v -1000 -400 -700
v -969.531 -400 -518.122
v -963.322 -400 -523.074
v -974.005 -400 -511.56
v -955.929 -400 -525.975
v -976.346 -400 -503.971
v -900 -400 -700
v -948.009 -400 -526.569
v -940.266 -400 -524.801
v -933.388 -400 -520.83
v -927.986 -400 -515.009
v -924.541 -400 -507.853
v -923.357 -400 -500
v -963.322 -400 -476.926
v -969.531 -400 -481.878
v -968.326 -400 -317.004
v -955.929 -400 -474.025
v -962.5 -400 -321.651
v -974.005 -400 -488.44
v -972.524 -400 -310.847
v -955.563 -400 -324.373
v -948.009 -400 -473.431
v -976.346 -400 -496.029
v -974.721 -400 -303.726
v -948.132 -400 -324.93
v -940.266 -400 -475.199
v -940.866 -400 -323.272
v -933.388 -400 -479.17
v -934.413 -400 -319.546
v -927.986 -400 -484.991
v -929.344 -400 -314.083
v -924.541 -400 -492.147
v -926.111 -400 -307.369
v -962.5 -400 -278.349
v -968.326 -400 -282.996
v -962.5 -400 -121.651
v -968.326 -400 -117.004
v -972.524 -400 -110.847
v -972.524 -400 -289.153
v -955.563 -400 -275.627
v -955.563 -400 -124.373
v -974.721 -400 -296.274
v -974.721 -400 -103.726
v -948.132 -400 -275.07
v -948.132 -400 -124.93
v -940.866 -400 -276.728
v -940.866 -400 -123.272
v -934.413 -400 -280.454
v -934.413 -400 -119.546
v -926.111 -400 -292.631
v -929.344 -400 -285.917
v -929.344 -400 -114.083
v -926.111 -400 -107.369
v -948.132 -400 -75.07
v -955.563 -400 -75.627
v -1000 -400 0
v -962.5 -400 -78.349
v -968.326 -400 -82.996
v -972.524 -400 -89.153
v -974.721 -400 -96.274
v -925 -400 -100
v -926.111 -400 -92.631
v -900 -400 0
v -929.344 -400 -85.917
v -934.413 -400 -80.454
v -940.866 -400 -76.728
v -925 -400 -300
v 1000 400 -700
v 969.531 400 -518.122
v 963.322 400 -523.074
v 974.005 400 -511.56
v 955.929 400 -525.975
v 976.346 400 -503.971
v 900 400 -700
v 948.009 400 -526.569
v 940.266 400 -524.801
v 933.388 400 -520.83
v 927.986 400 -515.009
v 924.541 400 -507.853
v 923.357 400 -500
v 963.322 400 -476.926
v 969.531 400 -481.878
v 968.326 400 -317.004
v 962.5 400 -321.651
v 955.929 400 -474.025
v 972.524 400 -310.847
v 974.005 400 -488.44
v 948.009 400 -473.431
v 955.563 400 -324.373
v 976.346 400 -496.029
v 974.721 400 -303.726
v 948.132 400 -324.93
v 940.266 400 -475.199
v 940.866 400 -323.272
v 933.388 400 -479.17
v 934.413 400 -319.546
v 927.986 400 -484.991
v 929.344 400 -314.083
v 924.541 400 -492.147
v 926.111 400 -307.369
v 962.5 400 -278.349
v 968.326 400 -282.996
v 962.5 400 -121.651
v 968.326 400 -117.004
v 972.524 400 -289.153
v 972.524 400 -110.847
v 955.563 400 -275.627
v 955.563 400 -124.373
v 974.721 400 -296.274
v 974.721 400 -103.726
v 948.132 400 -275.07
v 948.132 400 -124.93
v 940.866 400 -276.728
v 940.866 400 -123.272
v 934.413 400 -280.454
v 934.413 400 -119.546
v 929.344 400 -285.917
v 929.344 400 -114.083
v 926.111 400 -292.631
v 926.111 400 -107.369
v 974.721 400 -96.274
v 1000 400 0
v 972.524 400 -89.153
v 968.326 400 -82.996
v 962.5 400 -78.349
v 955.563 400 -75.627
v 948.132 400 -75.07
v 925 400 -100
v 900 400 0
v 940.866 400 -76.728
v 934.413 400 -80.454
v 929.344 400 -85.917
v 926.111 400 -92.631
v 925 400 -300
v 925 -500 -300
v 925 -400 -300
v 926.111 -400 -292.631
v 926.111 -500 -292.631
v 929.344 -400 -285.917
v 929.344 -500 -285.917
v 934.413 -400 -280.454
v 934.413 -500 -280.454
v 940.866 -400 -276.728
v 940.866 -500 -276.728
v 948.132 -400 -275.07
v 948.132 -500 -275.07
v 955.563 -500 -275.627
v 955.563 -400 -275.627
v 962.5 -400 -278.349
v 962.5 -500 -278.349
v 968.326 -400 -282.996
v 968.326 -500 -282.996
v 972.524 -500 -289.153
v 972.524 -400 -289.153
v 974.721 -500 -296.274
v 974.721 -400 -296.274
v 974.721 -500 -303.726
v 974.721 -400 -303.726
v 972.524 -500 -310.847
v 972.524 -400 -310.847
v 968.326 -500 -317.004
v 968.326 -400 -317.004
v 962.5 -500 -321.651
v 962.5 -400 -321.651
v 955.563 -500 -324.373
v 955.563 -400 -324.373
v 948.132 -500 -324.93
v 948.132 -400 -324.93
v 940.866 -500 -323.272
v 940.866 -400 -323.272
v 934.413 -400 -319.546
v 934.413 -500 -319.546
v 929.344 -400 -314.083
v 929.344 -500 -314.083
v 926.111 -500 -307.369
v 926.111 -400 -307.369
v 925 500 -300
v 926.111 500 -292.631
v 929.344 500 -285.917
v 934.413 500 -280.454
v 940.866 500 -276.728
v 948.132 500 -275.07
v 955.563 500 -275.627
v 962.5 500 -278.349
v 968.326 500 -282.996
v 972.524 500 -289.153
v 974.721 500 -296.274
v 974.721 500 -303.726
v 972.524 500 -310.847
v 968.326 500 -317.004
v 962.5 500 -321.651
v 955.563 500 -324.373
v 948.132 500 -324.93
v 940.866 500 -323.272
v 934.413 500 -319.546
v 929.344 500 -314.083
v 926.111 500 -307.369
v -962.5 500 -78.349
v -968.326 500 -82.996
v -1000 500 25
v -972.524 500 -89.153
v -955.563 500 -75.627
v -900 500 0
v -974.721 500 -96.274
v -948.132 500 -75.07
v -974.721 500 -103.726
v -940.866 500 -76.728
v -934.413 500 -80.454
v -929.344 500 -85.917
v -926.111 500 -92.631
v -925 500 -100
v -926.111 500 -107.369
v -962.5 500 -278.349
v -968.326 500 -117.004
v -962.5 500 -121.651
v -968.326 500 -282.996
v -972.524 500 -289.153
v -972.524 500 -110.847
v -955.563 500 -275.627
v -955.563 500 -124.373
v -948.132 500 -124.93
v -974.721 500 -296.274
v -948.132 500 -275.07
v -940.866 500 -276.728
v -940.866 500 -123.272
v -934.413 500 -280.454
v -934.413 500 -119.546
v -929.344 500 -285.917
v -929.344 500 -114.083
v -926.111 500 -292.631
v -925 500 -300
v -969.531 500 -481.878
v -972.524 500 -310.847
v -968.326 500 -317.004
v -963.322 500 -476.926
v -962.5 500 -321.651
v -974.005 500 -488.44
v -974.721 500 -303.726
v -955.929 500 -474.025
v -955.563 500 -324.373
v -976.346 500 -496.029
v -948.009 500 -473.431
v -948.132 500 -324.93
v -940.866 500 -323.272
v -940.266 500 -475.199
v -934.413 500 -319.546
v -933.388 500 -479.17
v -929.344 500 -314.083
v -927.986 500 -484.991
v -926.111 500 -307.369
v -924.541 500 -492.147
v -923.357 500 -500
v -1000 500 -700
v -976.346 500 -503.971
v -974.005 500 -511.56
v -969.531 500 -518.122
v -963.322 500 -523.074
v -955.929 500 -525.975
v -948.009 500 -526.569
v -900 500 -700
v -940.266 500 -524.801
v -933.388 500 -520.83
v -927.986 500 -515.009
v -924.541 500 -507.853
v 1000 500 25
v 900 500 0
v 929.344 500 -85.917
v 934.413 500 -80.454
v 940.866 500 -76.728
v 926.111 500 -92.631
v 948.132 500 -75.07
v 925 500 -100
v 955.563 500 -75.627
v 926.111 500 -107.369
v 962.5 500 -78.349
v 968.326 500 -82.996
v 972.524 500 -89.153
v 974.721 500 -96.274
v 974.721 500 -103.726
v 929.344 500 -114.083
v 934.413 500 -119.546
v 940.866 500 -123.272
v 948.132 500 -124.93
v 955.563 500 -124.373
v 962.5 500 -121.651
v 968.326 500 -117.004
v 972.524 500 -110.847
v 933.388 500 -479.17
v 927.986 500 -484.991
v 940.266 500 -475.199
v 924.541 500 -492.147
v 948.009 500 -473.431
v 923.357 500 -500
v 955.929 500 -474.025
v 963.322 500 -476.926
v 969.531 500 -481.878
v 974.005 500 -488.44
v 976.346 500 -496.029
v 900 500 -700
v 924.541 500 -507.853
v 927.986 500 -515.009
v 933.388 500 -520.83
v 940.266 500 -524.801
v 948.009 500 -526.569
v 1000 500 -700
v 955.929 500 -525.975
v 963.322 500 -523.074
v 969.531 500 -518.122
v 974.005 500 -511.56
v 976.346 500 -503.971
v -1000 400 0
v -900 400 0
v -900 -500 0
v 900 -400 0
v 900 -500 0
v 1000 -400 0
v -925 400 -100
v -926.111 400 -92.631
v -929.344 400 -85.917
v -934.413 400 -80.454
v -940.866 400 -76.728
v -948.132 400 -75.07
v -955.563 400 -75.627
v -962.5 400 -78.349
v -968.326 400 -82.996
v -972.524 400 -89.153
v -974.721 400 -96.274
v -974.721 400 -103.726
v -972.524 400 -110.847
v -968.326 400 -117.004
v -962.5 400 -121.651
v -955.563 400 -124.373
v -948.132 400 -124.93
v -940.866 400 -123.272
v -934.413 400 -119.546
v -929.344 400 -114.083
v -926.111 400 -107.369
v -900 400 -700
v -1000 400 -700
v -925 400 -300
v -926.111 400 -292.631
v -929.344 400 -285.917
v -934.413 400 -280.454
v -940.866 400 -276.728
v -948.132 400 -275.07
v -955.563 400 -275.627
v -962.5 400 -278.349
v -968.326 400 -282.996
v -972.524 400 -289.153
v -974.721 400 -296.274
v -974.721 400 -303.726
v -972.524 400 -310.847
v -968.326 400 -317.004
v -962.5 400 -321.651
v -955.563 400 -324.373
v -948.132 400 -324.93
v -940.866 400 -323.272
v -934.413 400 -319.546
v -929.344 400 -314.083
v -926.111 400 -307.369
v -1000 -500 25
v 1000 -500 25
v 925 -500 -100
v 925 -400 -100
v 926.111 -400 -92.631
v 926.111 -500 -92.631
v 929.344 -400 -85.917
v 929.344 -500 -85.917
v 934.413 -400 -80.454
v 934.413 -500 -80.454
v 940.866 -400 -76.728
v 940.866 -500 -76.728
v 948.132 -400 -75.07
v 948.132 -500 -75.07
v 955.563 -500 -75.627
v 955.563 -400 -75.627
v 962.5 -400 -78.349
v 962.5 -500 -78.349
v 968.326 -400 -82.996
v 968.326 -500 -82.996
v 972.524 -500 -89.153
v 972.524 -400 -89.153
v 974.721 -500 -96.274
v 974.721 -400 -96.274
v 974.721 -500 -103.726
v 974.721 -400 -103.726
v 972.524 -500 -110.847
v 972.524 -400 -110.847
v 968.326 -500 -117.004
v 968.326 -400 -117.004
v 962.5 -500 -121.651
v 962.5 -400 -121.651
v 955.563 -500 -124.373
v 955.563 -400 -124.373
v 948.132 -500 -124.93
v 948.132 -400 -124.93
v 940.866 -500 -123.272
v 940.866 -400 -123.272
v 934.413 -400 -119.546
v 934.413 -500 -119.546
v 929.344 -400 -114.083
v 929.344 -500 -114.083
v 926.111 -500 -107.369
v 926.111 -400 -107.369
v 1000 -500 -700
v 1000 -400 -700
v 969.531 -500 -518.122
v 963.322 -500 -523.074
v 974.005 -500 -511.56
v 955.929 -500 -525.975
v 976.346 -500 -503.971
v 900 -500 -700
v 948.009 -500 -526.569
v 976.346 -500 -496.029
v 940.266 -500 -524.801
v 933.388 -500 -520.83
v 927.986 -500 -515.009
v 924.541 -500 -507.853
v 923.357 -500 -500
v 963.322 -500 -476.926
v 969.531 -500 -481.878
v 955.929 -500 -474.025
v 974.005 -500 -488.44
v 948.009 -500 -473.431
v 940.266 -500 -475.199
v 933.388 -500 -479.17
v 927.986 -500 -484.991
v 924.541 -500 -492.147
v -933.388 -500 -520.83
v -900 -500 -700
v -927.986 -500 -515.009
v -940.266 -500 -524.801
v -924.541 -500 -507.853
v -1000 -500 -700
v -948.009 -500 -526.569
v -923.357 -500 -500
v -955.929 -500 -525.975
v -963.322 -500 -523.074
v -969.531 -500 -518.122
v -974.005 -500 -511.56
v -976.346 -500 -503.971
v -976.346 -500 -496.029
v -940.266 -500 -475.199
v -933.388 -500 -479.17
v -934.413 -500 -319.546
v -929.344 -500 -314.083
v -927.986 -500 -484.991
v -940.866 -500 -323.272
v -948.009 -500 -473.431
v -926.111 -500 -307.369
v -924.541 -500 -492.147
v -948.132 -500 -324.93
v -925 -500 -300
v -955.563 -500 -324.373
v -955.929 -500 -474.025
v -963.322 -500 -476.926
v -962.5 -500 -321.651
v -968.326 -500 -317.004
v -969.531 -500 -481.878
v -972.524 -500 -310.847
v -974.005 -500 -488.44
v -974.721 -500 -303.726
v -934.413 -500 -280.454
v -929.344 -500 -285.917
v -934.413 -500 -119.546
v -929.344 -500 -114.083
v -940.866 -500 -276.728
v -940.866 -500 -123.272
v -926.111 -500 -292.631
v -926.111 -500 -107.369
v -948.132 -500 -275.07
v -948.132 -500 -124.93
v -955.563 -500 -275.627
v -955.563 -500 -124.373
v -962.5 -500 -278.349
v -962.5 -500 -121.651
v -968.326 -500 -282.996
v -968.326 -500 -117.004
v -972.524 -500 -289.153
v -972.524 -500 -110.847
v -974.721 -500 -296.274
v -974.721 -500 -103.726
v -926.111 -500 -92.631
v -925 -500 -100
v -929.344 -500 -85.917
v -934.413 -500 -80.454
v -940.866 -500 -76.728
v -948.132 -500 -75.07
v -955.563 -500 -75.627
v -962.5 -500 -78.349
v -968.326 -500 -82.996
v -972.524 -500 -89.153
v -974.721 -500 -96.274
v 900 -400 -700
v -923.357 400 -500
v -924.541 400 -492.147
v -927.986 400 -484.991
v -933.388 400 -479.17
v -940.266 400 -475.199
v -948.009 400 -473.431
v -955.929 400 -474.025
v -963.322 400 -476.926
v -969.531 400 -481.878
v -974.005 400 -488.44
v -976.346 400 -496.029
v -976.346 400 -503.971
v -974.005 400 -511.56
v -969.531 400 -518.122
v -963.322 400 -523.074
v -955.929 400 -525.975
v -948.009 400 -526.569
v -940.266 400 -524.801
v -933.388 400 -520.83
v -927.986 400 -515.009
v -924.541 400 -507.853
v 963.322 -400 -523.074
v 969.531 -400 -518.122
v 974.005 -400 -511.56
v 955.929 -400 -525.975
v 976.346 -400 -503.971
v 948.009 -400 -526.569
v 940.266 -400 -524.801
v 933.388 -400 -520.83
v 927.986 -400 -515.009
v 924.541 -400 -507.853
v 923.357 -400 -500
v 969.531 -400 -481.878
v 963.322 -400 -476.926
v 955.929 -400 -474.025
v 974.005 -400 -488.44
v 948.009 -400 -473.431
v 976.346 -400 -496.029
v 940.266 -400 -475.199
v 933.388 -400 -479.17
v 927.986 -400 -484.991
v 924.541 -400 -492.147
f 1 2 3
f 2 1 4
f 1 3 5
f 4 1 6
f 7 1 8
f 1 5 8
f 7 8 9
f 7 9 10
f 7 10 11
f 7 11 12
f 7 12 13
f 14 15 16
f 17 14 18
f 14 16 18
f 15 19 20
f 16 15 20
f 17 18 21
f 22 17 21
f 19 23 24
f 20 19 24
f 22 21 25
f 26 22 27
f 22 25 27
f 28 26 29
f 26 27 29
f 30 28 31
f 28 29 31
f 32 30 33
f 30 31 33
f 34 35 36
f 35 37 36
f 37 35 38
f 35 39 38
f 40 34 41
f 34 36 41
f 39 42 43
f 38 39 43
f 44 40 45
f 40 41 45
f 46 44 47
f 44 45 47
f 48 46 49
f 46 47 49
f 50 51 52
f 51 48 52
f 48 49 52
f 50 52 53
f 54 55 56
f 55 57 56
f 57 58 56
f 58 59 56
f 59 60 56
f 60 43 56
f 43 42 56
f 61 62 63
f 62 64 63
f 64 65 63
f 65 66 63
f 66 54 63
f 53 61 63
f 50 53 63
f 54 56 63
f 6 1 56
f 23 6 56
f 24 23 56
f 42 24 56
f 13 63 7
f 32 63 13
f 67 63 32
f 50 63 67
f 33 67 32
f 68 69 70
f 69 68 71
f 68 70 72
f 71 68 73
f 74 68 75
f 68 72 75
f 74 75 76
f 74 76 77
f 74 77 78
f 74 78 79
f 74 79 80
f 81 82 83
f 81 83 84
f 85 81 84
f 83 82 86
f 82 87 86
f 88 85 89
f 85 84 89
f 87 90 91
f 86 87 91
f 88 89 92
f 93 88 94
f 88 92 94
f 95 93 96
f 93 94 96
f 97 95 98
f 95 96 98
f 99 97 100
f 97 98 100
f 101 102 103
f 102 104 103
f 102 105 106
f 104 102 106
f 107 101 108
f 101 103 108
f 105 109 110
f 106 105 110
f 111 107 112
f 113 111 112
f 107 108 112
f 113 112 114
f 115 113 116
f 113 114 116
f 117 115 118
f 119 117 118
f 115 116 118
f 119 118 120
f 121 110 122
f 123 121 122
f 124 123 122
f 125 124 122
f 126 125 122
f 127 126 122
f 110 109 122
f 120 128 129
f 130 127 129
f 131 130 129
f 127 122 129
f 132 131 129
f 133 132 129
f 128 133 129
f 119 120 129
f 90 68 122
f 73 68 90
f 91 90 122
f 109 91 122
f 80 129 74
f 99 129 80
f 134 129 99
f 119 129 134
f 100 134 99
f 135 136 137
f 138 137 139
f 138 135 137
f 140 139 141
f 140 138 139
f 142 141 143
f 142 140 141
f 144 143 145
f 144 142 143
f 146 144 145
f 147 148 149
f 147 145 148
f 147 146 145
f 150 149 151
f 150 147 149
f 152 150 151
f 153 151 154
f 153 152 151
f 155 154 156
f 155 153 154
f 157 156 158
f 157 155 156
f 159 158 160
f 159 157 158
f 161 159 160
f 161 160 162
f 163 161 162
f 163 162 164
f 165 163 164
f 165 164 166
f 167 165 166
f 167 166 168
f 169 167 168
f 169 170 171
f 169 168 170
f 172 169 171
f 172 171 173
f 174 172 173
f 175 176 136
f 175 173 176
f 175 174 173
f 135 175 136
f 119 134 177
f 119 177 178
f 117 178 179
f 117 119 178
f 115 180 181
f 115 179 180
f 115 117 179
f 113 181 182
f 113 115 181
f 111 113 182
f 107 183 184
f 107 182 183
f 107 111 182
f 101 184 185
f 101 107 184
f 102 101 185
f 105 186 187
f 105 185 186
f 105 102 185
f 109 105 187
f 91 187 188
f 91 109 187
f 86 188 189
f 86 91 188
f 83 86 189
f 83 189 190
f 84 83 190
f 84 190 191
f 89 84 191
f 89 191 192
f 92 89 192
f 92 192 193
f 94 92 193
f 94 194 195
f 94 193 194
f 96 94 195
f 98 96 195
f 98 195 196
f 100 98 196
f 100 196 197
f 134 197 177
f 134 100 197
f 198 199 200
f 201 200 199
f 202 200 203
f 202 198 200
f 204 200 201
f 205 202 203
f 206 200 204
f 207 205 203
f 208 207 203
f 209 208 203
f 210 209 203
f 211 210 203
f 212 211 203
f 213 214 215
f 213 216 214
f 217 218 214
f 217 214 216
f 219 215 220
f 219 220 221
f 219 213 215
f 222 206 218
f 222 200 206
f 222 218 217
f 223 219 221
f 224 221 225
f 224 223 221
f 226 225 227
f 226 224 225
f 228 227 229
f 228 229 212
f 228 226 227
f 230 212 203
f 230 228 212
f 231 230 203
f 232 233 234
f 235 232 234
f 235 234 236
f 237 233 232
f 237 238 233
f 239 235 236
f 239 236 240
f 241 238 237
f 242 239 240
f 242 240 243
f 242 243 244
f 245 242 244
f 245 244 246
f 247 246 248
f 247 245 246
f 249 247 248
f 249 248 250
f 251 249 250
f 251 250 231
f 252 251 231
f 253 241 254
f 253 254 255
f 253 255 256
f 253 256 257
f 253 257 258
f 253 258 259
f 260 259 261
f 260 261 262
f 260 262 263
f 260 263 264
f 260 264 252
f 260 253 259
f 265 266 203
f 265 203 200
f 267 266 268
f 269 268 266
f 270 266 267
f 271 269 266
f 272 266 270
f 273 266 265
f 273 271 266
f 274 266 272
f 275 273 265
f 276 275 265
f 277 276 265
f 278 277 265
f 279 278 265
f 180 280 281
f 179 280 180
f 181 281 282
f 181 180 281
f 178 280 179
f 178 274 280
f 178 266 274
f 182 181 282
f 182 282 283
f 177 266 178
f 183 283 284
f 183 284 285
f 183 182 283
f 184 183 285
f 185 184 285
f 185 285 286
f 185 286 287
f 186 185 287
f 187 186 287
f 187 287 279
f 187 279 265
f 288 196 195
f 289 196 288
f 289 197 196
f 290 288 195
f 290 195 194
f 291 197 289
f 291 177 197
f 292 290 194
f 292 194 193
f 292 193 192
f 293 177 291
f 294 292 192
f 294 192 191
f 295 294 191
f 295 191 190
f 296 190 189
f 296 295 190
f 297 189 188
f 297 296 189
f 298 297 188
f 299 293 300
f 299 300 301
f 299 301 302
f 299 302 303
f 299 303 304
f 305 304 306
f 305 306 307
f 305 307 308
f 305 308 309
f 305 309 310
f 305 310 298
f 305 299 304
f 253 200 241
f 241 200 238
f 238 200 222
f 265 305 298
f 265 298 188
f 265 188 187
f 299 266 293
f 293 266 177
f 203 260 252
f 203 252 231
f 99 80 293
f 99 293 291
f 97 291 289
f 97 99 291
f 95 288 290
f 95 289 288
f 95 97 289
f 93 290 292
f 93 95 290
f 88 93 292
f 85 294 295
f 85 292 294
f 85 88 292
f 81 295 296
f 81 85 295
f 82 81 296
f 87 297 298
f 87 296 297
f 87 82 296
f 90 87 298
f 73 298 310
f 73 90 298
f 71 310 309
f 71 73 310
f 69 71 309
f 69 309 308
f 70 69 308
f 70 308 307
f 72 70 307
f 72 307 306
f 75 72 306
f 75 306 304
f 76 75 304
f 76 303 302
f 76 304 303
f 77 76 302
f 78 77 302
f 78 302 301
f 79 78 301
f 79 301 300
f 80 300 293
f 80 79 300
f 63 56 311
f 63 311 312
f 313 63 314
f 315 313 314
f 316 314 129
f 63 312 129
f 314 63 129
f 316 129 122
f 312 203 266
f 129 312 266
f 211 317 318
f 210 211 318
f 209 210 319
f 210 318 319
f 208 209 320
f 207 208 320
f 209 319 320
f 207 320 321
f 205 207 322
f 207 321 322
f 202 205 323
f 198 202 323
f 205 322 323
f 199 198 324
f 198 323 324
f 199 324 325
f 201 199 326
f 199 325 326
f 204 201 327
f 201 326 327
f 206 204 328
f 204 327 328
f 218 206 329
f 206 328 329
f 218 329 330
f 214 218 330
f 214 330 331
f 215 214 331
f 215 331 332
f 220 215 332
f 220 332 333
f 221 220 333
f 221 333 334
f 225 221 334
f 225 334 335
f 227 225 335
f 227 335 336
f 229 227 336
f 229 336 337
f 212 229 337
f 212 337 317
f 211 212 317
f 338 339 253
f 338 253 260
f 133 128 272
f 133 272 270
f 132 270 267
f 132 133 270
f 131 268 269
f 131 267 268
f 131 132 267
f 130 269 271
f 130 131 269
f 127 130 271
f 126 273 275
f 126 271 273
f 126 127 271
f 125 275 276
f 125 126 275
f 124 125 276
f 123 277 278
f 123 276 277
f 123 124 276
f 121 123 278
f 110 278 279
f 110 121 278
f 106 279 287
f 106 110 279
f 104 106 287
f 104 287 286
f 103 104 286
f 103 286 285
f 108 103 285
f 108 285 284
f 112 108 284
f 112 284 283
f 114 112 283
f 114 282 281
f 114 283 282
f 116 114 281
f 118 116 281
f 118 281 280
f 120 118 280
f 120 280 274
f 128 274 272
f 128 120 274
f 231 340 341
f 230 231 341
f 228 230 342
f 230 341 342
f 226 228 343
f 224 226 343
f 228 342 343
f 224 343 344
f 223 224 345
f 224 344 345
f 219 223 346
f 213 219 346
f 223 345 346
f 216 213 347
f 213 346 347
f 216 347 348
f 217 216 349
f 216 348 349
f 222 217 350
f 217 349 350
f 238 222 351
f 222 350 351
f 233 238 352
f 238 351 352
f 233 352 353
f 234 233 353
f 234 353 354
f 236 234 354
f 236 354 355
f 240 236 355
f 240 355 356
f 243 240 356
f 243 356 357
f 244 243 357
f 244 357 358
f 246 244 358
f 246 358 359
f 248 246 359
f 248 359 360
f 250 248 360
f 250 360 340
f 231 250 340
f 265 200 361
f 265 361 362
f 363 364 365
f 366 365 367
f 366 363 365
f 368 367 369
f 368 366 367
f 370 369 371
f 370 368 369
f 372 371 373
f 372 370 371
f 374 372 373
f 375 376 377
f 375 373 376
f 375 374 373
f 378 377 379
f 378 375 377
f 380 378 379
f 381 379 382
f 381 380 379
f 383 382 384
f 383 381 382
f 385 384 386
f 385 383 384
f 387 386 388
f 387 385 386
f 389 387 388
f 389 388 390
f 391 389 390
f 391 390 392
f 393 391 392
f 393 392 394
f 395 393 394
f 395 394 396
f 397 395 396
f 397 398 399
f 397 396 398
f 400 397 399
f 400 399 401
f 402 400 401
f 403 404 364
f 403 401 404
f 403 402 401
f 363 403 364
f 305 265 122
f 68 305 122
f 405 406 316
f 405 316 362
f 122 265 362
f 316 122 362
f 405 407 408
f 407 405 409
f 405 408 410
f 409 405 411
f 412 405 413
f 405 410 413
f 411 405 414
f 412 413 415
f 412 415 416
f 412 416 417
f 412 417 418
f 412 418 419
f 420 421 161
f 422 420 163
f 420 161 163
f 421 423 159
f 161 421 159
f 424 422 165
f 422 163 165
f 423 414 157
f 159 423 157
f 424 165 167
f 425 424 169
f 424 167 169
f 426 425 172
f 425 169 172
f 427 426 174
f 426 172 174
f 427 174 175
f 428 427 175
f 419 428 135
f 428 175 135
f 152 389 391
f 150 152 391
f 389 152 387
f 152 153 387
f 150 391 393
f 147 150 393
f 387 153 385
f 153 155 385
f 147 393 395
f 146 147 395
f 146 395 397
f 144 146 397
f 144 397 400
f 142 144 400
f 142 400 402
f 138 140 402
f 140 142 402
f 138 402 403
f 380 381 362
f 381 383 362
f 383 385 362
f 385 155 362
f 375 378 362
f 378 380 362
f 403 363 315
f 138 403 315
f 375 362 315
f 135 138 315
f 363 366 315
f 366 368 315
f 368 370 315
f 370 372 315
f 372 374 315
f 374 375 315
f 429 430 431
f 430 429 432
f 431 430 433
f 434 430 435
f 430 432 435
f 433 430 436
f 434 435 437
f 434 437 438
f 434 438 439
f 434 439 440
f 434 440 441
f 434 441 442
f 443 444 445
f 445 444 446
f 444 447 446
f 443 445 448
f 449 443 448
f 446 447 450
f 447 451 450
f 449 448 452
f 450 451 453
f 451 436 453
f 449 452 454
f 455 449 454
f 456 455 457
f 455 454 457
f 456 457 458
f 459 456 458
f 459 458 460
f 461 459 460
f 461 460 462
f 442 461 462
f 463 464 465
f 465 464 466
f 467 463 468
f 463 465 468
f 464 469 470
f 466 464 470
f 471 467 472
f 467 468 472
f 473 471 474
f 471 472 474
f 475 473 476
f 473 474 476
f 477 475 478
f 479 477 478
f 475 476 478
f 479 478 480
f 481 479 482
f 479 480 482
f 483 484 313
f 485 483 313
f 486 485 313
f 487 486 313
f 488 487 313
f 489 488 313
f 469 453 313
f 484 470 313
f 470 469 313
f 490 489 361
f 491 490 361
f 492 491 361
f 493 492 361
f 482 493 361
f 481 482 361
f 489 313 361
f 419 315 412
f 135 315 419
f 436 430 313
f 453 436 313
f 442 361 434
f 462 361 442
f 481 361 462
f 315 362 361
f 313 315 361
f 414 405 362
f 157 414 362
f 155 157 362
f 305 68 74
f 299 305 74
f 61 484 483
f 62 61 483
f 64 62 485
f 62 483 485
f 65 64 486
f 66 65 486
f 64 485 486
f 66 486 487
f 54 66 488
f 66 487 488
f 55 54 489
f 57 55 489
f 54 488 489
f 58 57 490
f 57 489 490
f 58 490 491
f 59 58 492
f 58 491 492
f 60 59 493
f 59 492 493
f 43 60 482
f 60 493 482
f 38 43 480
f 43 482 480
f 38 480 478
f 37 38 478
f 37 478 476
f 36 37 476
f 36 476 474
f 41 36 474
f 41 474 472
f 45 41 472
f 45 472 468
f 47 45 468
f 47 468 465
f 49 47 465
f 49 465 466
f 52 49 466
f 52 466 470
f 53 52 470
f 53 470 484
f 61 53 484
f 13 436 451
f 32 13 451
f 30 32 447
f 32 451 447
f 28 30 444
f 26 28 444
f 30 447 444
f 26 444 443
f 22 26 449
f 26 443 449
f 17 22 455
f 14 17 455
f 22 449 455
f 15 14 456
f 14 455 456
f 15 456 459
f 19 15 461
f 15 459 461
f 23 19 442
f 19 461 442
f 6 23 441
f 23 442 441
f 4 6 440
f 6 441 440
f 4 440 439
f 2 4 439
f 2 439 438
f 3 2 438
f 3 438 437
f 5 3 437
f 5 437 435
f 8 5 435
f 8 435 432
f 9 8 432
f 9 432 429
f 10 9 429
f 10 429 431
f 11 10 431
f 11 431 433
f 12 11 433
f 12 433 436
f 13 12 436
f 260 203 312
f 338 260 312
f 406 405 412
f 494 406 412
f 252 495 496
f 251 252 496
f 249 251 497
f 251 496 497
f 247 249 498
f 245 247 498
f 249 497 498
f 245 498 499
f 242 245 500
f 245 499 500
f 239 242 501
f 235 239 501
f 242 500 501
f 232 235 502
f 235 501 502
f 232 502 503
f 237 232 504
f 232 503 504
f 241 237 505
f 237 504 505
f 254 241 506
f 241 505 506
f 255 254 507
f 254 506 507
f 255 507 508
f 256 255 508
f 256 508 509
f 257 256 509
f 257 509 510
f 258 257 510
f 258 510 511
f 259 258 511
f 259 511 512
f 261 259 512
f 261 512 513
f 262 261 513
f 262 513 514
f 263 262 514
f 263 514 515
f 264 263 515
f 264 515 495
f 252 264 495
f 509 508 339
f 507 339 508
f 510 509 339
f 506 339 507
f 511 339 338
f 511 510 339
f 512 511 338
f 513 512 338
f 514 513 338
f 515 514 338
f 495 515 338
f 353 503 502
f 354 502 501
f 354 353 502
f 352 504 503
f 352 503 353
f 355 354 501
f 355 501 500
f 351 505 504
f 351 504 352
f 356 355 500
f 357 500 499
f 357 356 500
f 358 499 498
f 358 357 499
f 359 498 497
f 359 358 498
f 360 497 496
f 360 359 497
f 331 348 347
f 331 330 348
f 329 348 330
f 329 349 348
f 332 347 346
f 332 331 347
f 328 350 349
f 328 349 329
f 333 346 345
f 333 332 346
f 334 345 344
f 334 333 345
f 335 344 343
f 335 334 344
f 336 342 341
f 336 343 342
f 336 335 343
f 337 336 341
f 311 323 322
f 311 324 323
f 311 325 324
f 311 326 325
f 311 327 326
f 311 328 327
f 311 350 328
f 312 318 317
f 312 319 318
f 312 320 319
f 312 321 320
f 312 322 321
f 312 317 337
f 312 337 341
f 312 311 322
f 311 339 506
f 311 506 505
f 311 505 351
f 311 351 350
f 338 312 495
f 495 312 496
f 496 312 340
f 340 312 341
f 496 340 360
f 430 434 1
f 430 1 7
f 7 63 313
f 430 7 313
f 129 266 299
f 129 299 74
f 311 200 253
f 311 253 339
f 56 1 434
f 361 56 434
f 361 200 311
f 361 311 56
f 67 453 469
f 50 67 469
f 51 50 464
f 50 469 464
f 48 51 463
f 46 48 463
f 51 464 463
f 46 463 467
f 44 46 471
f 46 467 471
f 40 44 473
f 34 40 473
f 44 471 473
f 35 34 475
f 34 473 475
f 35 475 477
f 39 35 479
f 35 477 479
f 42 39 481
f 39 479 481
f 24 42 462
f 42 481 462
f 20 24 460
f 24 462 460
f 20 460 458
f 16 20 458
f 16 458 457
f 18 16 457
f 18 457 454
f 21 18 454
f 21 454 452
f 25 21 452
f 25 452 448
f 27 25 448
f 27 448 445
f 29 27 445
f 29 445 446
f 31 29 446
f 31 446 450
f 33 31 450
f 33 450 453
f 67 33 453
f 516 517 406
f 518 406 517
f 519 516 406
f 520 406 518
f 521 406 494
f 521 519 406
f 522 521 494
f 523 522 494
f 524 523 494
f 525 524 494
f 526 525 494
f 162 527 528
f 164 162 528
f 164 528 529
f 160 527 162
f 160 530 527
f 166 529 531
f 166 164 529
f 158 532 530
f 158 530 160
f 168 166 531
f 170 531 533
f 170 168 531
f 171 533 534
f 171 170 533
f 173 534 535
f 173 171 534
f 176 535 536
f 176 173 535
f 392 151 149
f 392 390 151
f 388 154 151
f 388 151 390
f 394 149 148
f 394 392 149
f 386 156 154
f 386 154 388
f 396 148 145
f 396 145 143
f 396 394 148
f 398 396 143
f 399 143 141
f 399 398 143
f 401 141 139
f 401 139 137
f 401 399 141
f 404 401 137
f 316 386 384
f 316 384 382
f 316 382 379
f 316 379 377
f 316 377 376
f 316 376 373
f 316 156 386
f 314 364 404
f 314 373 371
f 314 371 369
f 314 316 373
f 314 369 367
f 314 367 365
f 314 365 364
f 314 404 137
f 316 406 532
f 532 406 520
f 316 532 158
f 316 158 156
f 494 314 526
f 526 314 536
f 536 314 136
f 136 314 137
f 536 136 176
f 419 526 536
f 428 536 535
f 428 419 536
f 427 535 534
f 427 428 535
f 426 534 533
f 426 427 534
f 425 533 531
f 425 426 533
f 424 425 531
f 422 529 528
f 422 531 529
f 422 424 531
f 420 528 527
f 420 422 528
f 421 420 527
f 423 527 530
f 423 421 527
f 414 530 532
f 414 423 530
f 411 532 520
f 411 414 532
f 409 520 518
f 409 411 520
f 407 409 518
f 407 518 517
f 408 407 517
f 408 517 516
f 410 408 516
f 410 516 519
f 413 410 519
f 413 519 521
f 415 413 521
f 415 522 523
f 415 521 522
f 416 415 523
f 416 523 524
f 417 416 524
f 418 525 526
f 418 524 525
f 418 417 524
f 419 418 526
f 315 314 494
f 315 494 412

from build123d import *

# Parameters (mm, degrees)
F0_W     = 2000
F0_H     = 1000
F1_DEPTH = 25
F2_W     = 100
F2_H     = 100
F4_DEPTH = 700
F3_R     = 25
F3_R_2   = 26.6431742527
F5_DEPTH = 1000.001
F6_R     = 138.4561690077
F7_W     = 118.5409426689
F7_H     = 157.5430333614
F9_T     = 2.5


# Not quite as in the source:
# - a pattern or mirror of a feature is missing from the dataset's text; its kind, count and spacing are read off the source's solid
# - a shell that OpenCascade refuses in one call is made with other operations: the cavity is built on its own and cut out


with BuildPart() as f1:
    # F0 (on Top) → F1 (new body)
    with BuildSketch(Plane.XY):
        Rectangle(F0_W, F0_H)
    extrude(amount=F1_DEPTH)

    # F2 (on face) → F4 (join)
    with BuildSketch(Plane(origin=(0, 0, 0), x_dir=(1, 0, 0), z_dir=(0, 0, -1))):
        with Locations((-950, 450)):
            Rectangle(F2_W, F2_H)
        with Locations((-950, -450)):
            Rectangle(F2_W, F2_H)
    f4 = extrude(amount=F4_DEPTH)

    # F4_copies: F4 across plane
    add(f4.mirror(Plane(origin=(0, 0, 0), x_dir=(0, 0, 1), z_dir=(1, 0, 0))))

    # F3 (on face) → F5 (cut, through all)
    with BuildSketch(Plane.XZ.offset(500)):
        with Locations((-950, -100)):
            Circle(F3_R)
        with Locations((-950, -300)):
            Circle(F3_R)
        with Locations((-950, -500)):
            Circle(F3_R_2)
    f5 = extrude(amount=-F5_DEPTH, mode=Mode.SUBTRACT)

    # F5_copies: F5 across plane
    add(f5.mirror(Plane(origin=(0, 0, 0), x_dir=(0, 0, 1), z_dir=(1, 0, 0))), mode=Mode.SUBTRACT)


with BuildPart() as f8:
    # F6 (on face) → F8 section 0
    with BuildSketch(Plane.XZ.offset(500)):
        with Locations((508.7250471115, -680.1778674126)):
            Circle(F6_R)
    # F7 (on face) → F8 section 1
    with BuildSketch(Plane.YZ.offset(-900)):
        with Locations((720.3351557255, -315.4024332762)):
            Rectangle(F7_W, F7_H)
    loft()

    # F9: shell of thickness 2.5, made by hand


with BuildPart() as f9_core1:
    # F9_t2: copy of F8
    add(f8.part)

    # the walls: a layer under each face that stays
    f9_faces = [f9_core1.faces().sort_by_distance(p)[0] for p in [
        (508.7250471115, -500, -680.1778674126),
        (-900, 720.3351557255, -315.4024332762),
    ]]
    thicken(f9_faces, amount=-F9_T, mode=Mode.SUBTRACT)


with BuildPart() as f8_1:
    add(f8.part)

    # what is left inside the walls is the cavity
    f9_cavity = [f9_core1.part.solids().sort_by_distance(p)[0] for p in [
        (-53.137215, -112.959985, -558.586056),
    ]]
    add(f9_cavity, mode=Mode.SUBTRACT)


solid = f1.part
